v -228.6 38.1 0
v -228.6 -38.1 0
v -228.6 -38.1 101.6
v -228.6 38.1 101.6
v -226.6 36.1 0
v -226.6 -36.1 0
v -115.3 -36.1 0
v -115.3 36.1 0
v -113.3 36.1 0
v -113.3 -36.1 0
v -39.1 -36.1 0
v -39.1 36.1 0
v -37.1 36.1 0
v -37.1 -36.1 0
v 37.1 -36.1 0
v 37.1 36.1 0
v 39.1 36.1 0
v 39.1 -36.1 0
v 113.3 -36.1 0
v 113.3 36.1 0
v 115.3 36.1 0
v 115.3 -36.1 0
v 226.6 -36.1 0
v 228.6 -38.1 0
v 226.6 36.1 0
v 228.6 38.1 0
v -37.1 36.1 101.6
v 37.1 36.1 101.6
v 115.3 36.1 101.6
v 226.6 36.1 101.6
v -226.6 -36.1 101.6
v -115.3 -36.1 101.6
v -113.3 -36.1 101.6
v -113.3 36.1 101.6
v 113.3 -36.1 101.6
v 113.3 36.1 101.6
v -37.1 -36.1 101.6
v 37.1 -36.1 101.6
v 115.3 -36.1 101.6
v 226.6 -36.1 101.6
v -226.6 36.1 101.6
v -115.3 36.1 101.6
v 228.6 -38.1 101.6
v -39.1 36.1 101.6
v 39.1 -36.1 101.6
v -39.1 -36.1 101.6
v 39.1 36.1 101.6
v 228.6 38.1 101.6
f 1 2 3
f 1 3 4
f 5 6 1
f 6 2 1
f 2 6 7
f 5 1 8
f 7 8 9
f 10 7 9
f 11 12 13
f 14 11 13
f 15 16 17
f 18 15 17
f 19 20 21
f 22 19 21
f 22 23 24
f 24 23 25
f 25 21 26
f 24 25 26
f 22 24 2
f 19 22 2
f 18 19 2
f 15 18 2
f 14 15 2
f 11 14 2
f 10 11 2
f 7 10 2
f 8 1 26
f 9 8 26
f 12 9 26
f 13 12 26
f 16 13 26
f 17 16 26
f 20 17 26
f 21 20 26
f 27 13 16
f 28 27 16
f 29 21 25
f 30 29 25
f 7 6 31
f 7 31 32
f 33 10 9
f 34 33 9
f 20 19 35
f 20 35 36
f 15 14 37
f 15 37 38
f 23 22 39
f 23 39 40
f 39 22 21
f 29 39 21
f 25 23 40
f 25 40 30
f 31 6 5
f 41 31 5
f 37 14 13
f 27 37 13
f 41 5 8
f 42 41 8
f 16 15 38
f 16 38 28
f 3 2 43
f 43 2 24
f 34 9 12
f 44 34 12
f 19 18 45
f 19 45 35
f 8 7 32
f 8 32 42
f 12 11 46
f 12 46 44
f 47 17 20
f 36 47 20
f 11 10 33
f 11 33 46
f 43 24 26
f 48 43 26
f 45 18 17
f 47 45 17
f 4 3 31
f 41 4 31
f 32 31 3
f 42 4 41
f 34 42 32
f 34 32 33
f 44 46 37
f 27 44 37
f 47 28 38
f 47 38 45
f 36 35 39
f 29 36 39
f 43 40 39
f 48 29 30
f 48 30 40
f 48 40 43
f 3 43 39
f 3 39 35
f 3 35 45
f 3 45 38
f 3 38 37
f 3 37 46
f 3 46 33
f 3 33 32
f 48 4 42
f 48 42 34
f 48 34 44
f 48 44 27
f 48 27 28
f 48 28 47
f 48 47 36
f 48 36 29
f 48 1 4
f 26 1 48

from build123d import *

# Parameters (mm, degrees)
SKETCH_3_W          = 457.2
SKETCH_3_H          = 76.2
EXTRUDE_4_DEPTH     = 101.6
SKETCH_3_3_W        = 111.3
SKETCH_3_3_H        = 72.2
SKETCH_3_3_W_2      = 74.2
CUT_EXTRUDE_2_DEPTH = 102.6


with BuildPart() as part:
    # Эскиз3 → Бобышка-Вытянуть4 (new body)
    with BuildSketch(Plane.XY):
        Rectangle(SKETCH_3_W, SKETCH_3_H)
    extrude(amount=EXTRUDE_4_DEPTH)

    # Эскиз3<3> → Вырез-Вытянуть2 (cut, through all)
    with BuildSketch(Plane.XY):
        with Locations((-170.95, 0)):
            Rectangle(SKETCH_3_3_W, SKETCH_3_3_H)
        with Locations((-76.2, 0)):
            Rectangle(SKETCH_3_3_W_2, SKETCH_3_3_H)
        Rectangle(SKETCH_3_3_W_2, SKETCH_3_3_H)
        with Locations((76.2, 0)):
            Rectangle(SKETCH_3_3_W_2, SKETCH_3_3_H)
        with Locations((170.95, 0)):
            Rectangle(SKETCH_3_3_W, SKETCH_3_3_H)
    extrude(amount=CUT_EXTRUDE_2_DEPTH, mode=Mode.SUBTRACT)


solid = part.part
